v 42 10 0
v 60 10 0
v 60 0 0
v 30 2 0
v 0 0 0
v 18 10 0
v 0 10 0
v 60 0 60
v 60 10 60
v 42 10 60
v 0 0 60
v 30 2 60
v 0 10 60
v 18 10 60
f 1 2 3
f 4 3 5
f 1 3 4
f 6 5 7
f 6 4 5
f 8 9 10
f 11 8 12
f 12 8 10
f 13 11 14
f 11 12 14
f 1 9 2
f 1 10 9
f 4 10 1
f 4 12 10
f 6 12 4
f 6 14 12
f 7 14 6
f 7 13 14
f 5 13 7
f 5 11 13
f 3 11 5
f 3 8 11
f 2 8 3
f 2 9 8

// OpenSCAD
$fn = 32;

// ----------------------------------------------------------------------
// V guide rail: vway, 60 mm wide
// ----------------------------------------------------------------------

// --- parameters (mm) ---
rail_w = 60;              // rail width, X
base_t = 10;              // base plate thickness
v_depth = 8;              // V feature depth / height
v_half_w = 12;            // half width of the V at the base face
plate_t = 60;             // rail length, Z (the extrusion height)
fit_tol = 0.05;           // declared fit tolerance (prompt contract)
free_tol = 0.2;           // declared free tolerance (prompt contract)

profile = [[0, 0], [60, 0], [60, 10], [42, 10], [30, 2], [18, 10], [0, 10]];  // primary outline, 7 points, counter clockwise

// --- the one profile operation ---
linear_extrude(height = plate_t) polygon(points = profile);
